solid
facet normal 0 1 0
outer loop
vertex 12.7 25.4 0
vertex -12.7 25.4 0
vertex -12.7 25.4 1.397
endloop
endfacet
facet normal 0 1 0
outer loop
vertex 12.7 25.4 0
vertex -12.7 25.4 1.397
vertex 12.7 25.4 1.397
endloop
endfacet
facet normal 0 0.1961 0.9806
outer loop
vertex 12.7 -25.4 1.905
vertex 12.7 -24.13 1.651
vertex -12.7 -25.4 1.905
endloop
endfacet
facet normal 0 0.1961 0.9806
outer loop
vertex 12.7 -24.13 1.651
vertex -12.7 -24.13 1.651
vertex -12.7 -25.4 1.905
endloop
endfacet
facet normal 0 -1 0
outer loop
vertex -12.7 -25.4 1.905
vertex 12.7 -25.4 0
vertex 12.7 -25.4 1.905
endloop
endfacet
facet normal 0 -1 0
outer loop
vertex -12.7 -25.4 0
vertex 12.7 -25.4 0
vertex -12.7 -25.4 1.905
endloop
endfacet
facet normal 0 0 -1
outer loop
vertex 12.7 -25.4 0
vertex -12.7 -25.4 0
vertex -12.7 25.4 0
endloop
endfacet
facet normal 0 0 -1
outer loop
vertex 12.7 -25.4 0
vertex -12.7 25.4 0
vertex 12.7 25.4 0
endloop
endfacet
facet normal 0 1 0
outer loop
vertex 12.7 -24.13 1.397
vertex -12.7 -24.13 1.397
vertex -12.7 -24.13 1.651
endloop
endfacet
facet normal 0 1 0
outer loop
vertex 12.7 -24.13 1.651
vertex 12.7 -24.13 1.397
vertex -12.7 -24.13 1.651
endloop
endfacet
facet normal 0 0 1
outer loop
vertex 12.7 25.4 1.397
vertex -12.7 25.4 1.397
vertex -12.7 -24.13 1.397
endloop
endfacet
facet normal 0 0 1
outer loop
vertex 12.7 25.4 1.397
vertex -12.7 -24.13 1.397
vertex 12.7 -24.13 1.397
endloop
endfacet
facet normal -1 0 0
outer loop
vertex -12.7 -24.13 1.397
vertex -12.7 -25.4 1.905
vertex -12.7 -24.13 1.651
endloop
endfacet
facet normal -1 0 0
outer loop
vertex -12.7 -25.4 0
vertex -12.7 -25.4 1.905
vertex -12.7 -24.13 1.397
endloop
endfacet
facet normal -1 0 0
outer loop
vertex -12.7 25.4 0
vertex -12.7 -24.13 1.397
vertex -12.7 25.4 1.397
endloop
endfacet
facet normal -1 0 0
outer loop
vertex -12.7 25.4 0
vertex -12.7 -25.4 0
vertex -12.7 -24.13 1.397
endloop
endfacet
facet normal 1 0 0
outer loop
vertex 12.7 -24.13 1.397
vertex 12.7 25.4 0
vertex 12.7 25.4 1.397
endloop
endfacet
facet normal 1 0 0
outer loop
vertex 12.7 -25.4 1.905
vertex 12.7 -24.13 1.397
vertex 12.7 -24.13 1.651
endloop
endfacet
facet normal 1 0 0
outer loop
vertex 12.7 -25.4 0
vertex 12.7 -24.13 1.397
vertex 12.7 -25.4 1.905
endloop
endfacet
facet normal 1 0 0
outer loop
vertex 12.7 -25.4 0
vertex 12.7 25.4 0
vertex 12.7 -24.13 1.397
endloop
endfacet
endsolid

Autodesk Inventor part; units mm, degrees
ref_plane "YZ Plane" through (0, 0, 0) normal (1, 0, 0) x (0, 1, 0)
ref_plane "XZ Plane" through (0, 0, 0) normal (0, 1, 0) x (-1, 0, 0)
ref_plane "XY Plane" through (0, 0, 0) normal (0, 0, 1) x (1, 0, 0)
sketch "Sketch1" plane through (0, 0, 0) normal (0, 0, 1) x (1, 0, 0)
  line L0 (-12.7, 25.4) -> (12.7, 25.4)
  line L1 (12.7, 25.4) -> (12.7, -25.4)
  line L2 (12.7, -25.4) -> (-12.7, -25.4)
  line L3 (-12.7, -25.4) -> (-12.7, 25.4)
  line L4 (-12.7, 25.4) -> (12.7, -25.4) construction
  line L5 (12.7, 25.4) -> (-12.7, -25.4) construction
  point P0 (0, 0)
  dimension "d0" = 25.4
  dimension "d1" = 50.8
extrude "Extrusion1" add sketch "Sketch1" along normal blind 1.397
sketch "Sketch3" plane through (12.7, -25.4, 0) normal (1, 0, 0) x (0, 0, -1)
  line L0 (0, 50.8) -> (0, 0) projected
  line L1 (0, 50.8) -> (-1.397, 50.8) projected
  line L2 (-1.397, 0) -> (-1.397, 50.8) projected
  line L3 (0, 0) -> (-1.397, 0) projected
  line L4 (-1.397, 0) -> (-1.905, 0)
  line L5 (-1.397, 0) -> (-1.397, 1.27)
  line L6 (-1.397, 53.34) -> (-1.397, 0) projected
  line L7 (-1.651, 1.27) -> (-1.397, 1.27)
  line L8 (-1.651, 1.27) -> (-1.905, 0)
  point P0 (0, 25.4)
  dimension "d8" = 0.508
  dimension "d9" = 1.27
  dimension "d10" = 0.254
ref_plane "Work Plane1" through (0, 0, 1.651) normal (0, 0, 1) x (1, 0, 0)
sketch "Sketch6" plane through (0, 0, 1.651) normal (0, 0, 1) x (1, 0, 0)
  line L0 (12.7, -24.13) -> (12.7, -25.4) projected
  line L1 (12.7, -25.4) -> (12.7, 25.4) projected
  line L2 (12.7, -24.765) -> (-12.7, -24.765)
  line L3 (-12.7, -25.4) -> (12.7, -25.4) projected
  line L4 (-12.7, -25.4) -> (12.7, -25.4) projected
  point P0 (0, 0)
  dimension "d12" = 0.635
sweep "Sweep1" add profiles "Sketch3" path "Sketch6" path curves L2 contours L4 L8 L7 L2
ref_plane "Work Plane2" through (-12.7, 0, 0) normal (0, -1, 0) x (1, 0, 0)
properties part number "wall"
